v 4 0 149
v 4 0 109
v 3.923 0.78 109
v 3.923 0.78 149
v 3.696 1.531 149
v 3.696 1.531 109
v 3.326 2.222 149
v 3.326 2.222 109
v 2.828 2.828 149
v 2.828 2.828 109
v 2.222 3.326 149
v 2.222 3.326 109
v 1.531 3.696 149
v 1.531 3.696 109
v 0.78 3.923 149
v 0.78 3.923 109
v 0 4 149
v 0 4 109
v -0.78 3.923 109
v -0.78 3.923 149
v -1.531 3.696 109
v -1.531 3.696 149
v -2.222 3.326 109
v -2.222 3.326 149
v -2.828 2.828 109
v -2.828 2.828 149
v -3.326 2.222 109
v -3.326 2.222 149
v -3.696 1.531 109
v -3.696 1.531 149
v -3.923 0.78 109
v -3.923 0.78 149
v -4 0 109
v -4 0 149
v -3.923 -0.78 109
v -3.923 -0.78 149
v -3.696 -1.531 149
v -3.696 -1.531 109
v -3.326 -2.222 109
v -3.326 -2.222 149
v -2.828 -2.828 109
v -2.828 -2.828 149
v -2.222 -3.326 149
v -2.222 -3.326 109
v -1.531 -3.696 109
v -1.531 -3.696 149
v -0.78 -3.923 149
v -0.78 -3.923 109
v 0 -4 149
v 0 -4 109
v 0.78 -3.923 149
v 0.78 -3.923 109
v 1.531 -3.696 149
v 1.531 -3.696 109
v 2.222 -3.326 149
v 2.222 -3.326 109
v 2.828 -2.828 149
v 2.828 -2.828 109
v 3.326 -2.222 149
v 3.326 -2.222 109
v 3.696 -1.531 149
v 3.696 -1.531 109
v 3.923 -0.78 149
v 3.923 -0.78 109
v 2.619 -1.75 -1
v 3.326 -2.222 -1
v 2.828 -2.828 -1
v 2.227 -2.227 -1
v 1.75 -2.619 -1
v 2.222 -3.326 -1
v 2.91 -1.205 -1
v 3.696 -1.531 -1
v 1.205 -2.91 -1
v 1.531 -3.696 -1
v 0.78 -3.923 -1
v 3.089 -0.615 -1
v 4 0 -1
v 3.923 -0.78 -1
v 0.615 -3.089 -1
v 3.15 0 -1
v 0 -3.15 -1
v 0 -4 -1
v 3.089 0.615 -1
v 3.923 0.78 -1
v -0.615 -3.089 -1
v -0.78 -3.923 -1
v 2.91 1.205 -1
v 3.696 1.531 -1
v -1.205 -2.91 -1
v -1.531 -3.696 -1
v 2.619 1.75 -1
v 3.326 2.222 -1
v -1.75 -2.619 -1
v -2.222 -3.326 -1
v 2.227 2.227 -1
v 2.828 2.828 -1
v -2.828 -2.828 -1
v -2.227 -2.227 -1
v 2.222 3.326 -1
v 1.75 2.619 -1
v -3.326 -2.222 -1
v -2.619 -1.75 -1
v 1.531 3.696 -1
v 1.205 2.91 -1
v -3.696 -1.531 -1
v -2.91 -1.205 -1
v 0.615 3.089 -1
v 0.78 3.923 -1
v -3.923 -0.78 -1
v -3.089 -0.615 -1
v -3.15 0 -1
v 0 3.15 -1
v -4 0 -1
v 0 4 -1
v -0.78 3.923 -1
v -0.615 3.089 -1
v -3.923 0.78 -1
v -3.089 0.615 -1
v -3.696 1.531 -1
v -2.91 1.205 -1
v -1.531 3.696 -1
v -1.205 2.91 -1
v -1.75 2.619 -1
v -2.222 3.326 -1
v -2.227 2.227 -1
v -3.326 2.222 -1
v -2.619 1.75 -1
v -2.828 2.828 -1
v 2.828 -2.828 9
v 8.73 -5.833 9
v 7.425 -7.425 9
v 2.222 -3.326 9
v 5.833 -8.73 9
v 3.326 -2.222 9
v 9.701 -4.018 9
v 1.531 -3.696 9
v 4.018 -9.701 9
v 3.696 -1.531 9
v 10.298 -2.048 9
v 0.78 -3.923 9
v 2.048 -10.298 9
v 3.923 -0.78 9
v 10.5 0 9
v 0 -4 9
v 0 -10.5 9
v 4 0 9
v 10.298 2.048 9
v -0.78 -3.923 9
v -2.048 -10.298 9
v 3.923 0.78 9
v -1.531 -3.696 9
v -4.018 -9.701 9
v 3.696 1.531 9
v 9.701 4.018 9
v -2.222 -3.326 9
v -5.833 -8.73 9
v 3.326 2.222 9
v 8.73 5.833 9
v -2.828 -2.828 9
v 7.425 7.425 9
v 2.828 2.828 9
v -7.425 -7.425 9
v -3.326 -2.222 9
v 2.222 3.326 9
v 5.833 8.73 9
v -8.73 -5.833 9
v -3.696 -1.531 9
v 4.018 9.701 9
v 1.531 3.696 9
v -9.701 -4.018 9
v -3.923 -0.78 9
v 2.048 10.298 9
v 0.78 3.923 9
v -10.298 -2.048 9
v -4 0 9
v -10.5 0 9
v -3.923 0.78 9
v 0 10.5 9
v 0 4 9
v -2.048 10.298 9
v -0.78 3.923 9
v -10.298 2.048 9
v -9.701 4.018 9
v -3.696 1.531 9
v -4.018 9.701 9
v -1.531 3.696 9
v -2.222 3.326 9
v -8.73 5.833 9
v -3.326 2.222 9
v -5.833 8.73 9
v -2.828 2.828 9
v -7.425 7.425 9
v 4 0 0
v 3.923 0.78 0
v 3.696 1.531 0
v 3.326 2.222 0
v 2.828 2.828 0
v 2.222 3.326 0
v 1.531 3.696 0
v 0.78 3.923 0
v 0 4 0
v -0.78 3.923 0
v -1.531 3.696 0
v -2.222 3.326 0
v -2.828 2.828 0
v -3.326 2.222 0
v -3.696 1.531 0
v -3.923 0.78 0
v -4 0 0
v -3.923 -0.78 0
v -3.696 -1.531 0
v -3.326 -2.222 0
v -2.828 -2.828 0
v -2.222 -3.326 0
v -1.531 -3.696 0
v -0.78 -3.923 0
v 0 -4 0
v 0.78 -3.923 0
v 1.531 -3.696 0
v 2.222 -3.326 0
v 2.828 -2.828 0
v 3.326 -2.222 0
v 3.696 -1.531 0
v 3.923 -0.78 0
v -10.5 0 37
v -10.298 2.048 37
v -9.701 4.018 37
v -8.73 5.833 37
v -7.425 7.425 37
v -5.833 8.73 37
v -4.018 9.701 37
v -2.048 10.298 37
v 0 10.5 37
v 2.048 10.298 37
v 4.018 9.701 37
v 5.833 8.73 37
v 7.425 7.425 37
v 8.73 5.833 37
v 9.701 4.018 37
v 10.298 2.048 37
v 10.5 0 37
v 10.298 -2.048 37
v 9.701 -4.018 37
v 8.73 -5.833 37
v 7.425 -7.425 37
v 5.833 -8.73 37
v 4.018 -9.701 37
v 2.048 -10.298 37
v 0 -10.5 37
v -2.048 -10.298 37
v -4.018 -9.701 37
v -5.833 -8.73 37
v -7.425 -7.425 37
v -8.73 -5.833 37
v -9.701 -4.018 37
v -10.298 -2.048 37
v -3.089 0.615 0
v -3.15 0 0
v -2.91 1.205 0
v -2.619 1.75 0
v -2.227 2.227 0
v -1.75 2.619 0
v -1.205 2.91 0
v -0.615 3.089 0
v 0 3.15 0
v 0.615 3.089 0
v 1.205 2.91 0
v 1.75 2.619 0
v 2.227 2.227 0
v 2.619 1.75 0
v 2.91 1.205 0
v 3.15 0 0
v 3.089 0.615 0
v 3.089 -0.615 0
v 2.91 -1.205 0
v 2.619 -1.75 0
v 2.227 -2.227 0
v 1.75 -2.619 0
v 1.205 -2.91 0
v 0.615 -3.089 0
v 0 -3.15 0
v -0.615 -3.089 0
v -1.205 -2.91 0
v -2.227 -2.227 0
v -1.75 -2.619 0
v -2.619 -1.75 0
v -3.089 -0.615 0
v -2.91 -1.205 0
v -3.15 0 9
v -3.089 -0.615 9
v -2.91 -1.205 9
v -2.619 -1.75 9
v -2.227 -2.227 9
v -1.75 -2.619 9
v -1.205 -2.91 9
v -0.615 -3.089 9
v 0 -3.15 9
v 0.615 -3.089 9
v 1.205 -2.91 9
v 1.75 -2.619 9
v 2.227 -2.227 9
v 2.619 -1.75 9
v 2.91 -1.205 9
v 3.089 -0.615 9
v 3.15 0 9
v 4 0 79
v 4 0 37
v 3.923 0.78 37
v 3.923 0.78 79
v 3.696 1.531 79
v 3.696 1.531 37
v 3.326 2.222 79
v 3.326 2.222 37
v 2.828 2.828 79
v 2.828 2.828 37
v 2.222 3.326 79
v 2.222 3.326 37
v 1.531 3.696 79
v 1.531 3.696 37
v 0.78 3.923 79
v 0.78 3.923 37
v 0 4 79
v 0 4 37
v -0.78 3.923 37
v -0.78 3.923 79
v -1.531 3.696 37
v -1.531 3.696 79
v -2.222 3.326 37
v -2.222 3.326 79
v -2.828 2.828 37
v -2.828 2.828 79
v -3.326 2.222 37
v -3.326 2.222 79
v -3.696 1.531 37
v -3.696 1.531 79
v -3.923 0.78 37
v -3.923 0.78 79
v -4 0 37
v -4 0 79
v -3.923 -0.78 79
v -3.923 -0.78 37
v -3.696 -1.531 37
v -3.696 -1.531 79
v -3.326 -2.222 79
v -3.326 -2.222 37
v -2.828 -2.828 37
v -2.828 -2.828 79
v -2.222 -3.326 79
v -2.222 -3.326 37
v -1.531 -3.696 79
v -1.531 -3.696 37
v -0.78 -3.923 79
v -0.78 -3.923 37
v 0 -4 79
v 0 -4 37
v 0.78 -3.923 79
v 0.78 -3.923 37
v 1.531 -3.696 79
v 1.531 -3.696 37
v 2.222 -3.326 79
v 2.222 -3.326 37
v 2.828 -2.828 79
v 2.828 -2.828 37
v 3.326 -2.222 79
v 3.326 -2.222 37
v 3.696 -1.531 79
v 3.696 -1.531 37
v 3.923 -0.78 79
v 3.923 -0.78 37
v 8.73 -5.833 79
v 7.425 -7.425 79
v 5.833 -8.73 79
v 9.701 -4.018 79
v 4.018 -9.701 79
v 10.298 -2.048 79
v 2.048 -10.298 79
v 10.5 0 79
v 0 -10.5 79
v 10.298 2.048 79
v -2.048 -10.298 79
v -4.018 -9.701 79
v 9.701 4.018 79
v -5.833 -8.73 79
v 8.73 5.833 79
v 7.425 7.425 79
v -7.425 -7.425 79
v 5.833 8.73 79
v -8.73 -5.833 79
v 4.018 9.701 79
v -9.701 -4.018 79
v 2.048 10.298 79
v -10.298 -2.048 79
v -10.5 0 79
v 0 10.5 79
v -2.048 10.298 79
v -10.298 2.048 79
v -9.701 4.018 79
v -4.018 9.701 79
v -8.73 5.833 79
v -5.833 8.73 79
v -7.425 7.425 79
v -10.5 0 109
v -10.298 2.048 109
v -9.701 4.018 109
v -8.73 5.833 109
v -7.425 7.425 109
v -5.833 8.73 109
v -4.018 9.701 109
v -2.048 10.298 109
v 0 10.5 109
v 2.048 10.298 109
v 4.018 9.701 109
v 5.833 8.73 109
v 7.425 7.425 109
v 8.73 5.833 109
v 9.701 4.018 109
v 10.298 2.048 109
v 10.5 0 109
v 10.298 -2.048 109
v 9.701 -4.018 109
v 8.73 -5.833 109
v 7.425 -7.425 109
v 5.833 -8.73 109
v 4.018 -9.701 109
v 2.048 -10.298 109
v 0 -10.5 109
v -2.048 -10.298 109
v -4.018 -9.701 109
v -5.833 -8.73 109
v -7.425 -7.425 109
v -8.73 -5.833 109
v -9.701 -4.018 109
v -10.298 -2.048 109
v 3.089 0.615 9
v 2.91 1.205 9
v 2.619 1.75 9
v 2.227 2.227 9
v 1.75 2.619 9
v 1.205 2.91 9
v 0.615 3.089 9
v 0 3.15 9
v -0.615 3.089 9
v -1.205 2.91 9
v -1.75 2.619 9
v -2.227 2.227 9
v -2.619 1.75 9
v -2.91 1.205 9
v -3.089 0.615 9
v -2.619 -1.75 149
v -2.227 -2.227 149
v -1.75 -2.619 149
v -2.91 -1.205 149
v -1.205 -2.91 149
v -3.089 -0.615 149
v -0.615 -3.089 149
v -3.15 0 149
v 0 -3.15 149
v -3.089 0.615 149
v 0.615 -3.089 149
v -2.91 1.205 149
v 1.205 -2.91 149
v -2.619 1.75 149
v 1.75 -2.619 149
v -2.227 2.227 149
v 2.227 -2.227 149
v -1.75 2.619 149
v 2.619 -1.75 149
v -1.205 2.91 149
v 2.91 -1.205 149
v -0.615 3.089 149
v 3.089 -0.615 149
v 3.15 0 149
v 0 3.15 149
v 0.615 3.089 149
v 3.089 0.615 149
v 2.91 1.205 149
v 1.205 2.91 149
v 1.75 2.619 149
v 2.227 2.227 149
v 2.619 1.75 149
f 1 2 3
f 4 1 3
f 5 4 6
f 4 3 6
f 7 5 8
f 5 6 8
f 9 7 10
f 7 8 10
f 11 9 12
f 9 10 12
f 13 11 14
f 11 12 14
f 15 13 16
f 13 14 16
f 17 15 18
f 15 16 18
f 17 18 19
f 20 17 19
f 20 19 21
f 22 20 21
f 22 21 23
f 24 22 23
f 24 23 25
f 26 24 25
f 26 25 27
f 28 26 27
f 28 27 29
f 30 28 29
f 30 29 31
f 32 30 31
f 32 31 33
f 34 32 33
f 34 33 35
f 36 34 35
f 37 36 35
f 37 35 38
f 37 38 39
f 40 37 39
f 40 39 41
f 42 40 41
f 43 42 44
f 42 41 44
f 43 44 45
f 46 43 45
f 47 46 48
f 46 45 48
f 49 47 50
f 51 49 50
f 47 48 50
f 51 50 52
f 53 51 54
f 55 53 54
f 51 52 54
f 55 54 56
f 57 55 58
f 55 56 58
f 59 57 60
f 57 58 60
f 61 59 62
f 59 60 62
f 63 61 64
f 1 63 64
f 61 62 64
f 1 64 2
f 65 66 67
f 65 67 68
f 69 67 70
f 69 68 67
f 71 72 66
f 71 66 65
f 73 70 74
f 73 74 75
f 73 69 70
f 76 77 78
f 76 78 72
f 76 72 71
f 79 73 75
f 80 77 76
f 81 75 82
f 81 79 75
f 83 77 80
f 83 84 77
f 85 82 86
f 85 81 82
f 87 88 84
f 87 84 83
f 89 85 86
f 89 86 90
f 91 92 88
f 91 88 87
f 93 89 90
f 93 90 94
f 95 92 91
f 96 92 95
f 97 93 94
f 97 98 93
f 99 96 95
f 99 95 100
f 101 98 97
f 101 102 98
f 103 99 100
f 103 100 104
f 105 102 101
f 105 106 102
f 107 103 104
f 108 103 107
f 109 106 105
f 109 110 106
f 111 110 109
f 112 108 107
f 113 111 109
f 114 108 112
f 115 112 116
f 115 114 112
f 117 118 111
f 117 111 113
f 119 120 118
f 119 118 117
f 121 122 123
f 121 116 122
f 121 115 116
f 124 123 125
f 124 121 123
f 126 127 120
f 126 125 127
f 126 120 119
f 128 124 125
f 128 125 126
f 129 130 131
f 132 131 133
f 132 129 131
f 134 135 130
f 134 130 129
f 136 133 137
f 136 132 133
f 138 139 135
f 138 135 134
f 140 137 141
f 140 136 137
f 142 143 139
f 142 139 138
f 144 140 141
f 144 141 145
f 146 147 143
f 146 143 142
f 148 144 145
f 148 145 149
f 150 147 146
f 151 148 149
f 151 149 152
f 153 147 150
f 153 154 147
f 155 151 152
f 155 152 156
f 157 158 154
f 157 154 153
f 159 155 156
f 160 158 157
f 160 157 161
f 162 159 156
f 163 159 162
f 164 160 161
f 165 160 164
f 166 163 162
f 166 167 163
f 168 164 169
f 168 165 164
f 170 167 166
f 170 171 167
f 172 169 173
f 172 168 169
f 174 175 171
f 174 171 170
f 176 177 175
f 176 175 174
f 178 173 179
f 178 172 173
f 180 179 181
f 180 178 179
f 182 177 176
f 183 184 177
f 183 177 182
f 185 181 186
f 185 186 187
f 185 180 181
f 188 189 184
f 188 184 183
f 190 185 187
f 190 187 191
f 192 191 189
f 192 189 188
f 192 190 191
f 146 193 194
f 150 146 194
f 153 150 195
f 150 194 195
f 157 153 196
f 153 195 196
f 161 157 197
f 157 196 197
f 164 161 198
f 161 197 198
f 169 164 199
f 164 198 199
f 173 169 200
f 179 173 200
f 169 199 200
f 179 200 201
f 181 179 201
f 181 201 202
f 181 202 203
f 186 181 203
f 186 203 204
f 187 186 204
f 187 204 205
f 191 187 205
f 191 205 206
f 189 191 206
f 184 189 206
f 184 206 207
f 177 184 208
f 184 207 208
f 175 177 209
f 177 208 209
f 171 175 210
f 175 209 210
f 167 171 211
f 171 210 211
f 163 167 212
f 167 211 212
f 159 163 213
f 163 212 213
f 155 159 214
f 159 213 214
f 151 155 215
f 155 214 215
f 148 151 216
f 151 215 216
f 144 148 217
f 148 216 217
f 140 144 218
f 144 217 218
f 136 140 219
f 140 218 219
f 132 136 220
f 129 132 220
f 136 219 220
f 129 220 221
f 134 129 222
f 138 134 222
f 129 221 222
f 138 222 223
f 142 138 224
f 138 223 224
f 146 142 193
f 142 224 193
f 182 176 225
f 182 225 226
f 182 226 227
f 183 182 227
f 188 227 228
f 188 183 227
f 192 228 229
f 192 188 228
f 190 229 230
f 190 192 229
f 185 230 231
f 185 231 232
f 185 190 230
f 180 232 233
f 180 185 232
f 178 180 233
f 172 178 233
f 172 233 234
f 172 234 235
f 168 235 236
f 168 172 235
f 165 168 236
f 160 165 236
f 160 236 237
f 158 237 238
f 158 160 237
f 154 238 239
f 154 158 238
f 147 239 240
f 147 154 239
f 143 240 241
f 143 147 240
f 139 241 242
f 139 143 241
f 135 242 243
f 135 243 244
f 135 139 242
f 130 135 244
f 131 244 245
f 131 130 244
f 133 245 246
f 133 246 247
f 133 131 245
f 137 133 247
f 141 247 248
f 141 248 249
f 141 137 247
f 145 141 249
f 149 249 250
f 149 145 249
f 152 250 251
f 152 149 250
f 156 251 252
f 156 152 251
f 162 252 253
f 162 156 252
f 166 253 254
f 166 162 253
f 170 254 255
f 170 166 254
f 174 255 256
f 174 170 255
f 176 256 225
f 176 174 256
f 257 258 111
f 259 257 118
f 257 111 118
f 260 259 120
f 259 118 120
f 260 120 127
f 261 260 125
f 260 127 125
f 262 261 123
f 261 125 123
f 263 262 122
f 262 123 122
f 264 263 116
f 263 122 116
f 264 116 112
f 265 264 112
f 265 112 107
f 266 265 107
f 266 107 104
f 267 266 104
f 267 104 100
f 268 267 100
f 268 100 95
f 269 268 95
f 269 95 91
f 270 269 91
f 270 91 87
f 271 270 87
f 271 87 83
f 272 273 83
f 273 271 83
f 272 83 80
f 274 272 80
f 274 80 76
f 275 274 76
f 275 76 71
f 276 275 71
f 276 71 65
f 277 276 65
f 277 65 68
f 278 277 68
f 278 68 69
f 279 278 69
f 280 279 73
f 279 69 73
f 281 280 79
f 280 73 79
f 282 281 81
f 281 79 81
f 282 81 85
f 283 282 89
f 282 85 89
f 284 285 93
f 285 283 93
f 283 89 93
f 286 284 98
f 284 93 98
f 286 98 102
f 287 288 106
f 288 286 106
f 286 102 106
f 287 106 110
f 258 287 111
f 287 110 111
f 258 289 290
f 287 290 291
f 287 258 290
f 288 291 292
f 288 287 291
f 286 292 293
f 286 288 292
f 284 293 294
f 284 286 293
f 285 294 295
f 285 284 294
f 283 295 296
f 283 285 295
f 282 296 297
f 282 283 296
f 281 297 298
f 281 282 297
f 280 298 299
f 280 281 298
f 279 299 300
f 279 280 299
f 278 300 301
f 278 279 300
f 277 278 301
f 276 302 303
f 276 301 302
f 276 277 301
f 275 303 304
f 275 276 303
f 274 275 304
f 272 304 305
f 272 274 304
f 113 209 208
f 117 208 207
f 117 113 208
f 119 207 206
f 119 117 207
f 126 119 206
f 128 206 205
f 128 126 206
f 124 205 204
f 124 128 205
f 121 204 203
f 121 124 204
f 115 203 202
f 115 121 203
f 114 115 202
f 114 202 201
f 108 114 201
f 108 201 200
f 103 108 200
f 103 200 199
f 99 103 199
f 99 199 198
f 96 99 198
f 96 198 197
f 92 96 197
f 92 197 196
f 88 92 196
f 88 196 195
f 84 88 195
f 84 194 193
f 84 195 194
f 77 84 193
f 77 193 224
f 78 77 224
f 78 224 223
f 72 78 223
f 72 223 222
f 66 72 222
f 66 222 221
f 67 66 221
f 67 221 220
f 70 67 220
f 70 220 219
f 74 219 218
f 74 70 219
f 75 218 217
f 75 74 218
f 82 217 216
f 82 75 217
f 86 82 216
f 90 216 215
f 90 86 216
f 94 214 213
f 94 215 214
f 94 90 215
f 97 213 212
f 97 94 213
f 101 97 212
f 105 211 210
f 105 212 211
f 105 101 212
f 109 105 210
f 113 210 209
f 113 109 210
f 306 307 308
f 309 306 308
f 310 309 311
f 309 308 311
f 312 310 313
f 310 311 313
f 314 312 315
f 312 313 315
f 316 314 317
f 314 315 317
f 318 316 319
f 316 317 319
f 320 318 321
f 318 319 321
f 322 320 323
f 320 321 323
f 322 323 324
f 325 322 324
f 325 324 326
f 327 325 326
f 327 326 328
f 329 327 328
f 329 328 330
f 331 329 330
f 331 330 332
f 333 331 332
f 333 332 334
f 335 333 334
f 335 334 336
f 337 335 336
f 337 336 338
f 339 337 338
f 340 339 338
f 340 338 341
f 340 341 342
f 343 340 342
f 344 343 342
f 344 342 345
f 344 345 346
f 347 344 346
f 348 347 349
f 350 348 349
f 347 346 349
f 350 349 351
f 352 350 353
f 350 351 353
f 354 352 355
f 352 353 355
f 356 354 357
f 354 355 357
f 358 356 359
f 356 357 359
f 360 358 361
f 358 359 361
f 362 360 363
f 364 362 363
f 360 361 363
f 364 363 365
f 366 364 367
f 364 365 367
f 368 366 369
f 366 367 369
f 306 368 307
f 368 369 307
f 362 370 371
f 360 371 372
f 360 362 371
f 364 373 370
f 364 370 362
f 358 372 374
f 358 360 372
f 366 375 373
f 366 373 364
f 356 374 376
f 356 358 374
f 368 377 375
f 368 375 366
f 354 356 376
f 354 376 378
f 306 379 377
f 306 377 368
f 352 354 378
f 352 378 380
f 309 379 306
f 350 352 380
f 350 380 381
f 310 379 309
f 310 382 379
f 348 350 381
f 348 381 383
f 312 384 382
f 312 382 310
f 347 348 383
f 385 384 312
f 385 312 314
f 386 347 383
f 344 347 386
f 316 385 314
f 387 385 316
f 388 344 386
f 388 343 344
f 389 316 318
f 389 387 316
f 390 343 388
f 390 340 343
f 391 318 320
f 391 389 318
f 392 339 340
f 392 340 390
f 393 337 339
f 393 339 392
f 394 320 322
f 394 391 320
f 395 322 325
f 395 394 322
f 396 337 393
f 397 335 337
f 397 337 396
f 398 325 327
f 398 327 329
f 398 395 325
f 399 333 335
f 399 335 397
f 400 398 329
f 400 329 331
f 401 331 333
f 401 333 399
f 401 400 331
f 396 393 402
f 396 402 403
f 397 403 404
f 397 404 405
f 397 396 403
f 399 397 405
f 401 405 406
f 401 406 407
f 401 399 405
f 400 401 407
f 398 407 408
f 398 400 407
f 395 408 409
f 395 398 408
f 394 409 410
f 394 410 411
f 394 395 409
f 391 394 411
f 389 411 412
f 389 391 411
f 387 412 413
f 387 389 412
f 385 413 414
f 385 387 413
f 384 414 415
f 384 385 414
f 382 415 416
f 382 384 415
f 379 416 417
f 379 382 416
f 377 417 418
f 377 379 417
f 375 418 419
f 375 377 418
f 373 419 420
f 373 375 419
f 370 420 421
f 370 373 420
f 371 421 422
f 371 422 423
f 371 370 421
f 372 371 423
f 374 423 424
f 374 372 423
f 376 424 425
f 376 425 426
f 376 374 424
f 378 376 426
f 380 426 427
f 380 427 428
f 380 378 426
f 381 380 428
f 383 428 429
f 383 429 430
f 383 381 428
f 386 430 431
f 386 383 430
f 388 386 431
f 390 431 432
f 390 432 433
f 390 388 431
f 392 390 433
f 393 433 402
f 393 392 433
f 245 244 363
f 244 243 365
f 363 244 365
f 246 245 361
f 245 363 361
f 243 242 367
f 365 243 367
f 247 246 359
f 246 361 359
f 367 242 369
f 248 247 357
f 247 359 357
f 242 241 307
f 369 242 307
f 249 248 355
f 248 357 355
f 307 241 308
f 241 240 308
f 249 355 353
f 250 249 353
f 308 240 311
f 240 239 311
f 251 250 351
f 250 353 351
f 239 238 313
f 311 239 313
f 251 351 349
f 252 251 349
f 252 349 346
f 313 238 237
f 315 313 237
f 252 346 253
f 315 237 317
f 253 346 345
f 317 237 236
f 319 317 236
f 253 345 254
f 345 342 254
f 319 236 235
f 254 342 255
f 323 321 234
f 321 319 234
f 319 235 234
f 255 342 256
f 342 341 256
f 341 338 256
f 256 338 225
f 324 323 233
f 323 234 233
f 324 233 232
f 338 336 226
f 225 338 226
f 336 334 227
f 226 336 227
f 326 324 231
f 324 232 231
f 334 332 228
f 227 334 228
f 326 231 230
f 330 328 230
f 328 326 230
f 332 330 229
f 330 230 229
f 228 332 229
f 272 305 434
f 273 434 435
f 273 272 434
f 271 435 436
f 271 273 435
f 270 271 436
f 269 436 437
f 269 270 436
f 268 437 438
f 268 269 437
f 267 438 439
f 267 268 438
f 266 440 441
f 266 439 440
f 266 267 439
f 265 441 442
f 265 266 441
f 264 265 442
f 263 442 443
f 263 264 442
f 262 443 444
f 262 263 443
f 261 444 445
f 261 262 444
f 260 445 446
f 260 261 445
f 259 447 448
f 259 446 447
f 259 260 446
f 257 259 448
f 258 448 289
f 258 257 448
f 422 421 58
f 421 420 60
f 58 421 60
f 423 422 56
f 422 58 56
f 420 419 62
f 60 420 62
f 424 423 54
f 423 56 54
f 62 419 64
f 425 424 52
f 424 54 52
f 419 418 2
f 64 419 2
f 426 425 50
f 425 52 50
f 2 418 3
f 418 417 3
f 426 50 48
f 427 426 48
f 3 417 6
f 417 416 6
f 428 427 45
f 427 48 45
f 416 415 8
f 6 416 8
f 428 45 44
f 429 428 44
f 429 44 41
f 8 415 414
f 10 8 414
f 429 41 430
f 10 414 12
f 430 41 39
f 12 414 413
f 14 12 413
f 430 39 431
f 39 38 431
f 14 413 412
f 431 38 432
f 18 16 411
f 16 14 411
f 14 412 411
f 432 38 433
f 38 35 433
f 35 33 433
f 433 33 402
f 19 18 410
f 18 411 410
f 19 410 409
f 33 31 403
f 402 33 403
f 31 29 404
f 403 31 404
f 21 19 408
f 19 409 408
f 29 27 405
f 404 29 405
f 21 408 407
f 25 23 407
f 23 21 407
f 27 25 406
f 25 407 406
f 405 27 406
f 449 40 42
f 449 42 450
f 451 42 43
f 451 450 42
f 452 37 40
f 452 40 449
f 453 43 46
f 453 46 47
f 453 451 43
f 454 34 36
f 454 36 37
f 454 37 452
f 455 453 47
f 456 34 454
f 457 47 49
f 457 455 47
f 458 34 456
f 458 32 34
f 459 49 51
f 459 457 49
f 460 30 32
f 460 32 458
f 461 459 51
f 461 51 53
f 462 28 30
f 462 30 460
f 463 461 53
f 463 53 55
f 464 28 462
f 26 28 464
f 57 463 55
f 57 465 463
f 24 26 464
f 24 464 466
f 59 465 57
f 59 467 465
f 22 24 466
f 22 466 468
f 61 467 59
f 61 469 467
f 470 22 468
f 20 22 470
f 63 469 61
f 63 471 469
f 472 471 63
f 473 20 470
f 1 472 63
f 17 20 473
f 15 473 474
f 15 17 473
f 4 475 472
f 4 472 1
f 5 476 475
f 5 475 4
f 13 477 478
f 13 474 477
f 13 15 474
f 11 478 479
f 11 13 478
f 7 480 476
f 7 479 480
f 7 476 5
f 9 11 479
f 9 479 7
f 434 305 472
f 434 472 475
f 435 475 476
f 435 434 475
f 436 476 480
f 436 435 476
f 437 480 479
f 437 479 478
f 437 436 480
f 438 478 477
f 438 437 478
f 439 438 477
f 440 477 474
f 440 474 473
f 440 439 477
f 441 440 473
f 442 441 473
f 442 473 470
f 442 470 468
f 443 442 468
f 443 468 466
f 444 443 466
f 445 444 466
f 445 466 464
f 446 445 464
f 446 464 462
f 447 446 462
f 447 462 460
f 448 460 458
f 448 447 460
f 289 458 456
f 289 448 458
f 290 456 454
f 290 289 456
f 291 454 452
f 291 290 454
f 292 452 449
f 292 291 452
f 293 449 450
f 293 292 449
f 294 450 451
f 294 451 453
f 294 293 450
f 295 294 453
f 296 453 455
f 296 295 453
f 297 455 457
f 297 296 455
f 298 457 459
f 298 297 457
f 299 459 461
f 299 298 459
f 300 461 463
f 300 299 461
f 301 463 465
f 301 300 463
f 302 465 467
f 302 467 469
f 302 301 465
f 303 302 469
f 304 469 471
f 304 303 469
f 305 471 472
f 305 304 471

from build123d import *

# Parameters (mm, degrees)
SKETCH_1_R          = 4
SKETCH_1_R_2        = 3.15
EXTRUDE_1_DEPTH     = 149
EXTRUDE_START       = 1
SKETCH_3_R          = 4
EXTRUDE_2_DEPTH     = 1
EXTRUDE_START_2     = -80
SKETCH_4_2_R        = 10.5
SKETCH_4_2_R_2      = 4
EXTRUDE_4_DEPTH     = 30
EXTRUDE_START_3     = -10
SKETCH_4_R          = 10.5
SKETCH_4_R_2        = 4
EXTRUDE_3_DEPTH     = 28
SKETCH_5_R          = 3.15
CUT_EXTRUDE_1_DEPTH = 10


with BuildPart() as part:
    # 草图1 → 凸台-拉伸1 (new body)
    with BuildSketch(Plane.XY):
        Circle(SKETCH_1_R)
        Circle(SKETCH_1_R_2, mode=Mode.SUBTRACT)
    extrude(amount=EXTRUDE_1_DEPTH)

    # 草图3 → 凸台-拉伸2 (add)
    with BuildSketch(Plane(origin=(0, 0, 0), x_dir=(-1, 0, 0), z_dir=(0, 0, -1)).offset(EXTRUDE_START)):
        Circle(SKETCH_3_R)
    extrude(amount=-EXTRUDE_2_DEPTH)

    # 草图4<2> → 凸台-拉伸4 (add)
    with BuildSketch(Plane(origin=(0, 0, -1), x_dir=(-1, 0, 0), z_dir=(0, 0, -1)).offset(EXTRUDE_START_2)):
        Circle(SKETCH_4_2_R)
        Circle(SKETCH_4_2_R_2, mode=Mode.SUBTRACT)
    extrude(amount=-EXTRUDE_4_DEPTH)

    # 草图4 → 凸台-拉伸3 (add)
    with BuildSketch(Plane(origin=(0, 0, -1), x_dir=(-1, 0, 0), z_dir=(0, 0, -1)).offset(EXTRUDE_START_3)):
        Circle(SKETCH_4_R)
        Circle(SKETCH_4_R_2, mode=Mode.SUBTRACT)
    extrude(amount=-EXTRUDE_3_DEPTH)

    # 草图5 → 切除-拉伸1 (cut)
    with BuildSketch(Plane(origin=(0, 0, -1), x_dir=(-1, 0, 0), z_dir=(0, 0, -1))):
        Circle(SKETCH_5_R)
    extrude(amount=-CUT_EXTRUDE_1_DEPTH, mode=Mode.SUBTRACT)


solid = part.part
